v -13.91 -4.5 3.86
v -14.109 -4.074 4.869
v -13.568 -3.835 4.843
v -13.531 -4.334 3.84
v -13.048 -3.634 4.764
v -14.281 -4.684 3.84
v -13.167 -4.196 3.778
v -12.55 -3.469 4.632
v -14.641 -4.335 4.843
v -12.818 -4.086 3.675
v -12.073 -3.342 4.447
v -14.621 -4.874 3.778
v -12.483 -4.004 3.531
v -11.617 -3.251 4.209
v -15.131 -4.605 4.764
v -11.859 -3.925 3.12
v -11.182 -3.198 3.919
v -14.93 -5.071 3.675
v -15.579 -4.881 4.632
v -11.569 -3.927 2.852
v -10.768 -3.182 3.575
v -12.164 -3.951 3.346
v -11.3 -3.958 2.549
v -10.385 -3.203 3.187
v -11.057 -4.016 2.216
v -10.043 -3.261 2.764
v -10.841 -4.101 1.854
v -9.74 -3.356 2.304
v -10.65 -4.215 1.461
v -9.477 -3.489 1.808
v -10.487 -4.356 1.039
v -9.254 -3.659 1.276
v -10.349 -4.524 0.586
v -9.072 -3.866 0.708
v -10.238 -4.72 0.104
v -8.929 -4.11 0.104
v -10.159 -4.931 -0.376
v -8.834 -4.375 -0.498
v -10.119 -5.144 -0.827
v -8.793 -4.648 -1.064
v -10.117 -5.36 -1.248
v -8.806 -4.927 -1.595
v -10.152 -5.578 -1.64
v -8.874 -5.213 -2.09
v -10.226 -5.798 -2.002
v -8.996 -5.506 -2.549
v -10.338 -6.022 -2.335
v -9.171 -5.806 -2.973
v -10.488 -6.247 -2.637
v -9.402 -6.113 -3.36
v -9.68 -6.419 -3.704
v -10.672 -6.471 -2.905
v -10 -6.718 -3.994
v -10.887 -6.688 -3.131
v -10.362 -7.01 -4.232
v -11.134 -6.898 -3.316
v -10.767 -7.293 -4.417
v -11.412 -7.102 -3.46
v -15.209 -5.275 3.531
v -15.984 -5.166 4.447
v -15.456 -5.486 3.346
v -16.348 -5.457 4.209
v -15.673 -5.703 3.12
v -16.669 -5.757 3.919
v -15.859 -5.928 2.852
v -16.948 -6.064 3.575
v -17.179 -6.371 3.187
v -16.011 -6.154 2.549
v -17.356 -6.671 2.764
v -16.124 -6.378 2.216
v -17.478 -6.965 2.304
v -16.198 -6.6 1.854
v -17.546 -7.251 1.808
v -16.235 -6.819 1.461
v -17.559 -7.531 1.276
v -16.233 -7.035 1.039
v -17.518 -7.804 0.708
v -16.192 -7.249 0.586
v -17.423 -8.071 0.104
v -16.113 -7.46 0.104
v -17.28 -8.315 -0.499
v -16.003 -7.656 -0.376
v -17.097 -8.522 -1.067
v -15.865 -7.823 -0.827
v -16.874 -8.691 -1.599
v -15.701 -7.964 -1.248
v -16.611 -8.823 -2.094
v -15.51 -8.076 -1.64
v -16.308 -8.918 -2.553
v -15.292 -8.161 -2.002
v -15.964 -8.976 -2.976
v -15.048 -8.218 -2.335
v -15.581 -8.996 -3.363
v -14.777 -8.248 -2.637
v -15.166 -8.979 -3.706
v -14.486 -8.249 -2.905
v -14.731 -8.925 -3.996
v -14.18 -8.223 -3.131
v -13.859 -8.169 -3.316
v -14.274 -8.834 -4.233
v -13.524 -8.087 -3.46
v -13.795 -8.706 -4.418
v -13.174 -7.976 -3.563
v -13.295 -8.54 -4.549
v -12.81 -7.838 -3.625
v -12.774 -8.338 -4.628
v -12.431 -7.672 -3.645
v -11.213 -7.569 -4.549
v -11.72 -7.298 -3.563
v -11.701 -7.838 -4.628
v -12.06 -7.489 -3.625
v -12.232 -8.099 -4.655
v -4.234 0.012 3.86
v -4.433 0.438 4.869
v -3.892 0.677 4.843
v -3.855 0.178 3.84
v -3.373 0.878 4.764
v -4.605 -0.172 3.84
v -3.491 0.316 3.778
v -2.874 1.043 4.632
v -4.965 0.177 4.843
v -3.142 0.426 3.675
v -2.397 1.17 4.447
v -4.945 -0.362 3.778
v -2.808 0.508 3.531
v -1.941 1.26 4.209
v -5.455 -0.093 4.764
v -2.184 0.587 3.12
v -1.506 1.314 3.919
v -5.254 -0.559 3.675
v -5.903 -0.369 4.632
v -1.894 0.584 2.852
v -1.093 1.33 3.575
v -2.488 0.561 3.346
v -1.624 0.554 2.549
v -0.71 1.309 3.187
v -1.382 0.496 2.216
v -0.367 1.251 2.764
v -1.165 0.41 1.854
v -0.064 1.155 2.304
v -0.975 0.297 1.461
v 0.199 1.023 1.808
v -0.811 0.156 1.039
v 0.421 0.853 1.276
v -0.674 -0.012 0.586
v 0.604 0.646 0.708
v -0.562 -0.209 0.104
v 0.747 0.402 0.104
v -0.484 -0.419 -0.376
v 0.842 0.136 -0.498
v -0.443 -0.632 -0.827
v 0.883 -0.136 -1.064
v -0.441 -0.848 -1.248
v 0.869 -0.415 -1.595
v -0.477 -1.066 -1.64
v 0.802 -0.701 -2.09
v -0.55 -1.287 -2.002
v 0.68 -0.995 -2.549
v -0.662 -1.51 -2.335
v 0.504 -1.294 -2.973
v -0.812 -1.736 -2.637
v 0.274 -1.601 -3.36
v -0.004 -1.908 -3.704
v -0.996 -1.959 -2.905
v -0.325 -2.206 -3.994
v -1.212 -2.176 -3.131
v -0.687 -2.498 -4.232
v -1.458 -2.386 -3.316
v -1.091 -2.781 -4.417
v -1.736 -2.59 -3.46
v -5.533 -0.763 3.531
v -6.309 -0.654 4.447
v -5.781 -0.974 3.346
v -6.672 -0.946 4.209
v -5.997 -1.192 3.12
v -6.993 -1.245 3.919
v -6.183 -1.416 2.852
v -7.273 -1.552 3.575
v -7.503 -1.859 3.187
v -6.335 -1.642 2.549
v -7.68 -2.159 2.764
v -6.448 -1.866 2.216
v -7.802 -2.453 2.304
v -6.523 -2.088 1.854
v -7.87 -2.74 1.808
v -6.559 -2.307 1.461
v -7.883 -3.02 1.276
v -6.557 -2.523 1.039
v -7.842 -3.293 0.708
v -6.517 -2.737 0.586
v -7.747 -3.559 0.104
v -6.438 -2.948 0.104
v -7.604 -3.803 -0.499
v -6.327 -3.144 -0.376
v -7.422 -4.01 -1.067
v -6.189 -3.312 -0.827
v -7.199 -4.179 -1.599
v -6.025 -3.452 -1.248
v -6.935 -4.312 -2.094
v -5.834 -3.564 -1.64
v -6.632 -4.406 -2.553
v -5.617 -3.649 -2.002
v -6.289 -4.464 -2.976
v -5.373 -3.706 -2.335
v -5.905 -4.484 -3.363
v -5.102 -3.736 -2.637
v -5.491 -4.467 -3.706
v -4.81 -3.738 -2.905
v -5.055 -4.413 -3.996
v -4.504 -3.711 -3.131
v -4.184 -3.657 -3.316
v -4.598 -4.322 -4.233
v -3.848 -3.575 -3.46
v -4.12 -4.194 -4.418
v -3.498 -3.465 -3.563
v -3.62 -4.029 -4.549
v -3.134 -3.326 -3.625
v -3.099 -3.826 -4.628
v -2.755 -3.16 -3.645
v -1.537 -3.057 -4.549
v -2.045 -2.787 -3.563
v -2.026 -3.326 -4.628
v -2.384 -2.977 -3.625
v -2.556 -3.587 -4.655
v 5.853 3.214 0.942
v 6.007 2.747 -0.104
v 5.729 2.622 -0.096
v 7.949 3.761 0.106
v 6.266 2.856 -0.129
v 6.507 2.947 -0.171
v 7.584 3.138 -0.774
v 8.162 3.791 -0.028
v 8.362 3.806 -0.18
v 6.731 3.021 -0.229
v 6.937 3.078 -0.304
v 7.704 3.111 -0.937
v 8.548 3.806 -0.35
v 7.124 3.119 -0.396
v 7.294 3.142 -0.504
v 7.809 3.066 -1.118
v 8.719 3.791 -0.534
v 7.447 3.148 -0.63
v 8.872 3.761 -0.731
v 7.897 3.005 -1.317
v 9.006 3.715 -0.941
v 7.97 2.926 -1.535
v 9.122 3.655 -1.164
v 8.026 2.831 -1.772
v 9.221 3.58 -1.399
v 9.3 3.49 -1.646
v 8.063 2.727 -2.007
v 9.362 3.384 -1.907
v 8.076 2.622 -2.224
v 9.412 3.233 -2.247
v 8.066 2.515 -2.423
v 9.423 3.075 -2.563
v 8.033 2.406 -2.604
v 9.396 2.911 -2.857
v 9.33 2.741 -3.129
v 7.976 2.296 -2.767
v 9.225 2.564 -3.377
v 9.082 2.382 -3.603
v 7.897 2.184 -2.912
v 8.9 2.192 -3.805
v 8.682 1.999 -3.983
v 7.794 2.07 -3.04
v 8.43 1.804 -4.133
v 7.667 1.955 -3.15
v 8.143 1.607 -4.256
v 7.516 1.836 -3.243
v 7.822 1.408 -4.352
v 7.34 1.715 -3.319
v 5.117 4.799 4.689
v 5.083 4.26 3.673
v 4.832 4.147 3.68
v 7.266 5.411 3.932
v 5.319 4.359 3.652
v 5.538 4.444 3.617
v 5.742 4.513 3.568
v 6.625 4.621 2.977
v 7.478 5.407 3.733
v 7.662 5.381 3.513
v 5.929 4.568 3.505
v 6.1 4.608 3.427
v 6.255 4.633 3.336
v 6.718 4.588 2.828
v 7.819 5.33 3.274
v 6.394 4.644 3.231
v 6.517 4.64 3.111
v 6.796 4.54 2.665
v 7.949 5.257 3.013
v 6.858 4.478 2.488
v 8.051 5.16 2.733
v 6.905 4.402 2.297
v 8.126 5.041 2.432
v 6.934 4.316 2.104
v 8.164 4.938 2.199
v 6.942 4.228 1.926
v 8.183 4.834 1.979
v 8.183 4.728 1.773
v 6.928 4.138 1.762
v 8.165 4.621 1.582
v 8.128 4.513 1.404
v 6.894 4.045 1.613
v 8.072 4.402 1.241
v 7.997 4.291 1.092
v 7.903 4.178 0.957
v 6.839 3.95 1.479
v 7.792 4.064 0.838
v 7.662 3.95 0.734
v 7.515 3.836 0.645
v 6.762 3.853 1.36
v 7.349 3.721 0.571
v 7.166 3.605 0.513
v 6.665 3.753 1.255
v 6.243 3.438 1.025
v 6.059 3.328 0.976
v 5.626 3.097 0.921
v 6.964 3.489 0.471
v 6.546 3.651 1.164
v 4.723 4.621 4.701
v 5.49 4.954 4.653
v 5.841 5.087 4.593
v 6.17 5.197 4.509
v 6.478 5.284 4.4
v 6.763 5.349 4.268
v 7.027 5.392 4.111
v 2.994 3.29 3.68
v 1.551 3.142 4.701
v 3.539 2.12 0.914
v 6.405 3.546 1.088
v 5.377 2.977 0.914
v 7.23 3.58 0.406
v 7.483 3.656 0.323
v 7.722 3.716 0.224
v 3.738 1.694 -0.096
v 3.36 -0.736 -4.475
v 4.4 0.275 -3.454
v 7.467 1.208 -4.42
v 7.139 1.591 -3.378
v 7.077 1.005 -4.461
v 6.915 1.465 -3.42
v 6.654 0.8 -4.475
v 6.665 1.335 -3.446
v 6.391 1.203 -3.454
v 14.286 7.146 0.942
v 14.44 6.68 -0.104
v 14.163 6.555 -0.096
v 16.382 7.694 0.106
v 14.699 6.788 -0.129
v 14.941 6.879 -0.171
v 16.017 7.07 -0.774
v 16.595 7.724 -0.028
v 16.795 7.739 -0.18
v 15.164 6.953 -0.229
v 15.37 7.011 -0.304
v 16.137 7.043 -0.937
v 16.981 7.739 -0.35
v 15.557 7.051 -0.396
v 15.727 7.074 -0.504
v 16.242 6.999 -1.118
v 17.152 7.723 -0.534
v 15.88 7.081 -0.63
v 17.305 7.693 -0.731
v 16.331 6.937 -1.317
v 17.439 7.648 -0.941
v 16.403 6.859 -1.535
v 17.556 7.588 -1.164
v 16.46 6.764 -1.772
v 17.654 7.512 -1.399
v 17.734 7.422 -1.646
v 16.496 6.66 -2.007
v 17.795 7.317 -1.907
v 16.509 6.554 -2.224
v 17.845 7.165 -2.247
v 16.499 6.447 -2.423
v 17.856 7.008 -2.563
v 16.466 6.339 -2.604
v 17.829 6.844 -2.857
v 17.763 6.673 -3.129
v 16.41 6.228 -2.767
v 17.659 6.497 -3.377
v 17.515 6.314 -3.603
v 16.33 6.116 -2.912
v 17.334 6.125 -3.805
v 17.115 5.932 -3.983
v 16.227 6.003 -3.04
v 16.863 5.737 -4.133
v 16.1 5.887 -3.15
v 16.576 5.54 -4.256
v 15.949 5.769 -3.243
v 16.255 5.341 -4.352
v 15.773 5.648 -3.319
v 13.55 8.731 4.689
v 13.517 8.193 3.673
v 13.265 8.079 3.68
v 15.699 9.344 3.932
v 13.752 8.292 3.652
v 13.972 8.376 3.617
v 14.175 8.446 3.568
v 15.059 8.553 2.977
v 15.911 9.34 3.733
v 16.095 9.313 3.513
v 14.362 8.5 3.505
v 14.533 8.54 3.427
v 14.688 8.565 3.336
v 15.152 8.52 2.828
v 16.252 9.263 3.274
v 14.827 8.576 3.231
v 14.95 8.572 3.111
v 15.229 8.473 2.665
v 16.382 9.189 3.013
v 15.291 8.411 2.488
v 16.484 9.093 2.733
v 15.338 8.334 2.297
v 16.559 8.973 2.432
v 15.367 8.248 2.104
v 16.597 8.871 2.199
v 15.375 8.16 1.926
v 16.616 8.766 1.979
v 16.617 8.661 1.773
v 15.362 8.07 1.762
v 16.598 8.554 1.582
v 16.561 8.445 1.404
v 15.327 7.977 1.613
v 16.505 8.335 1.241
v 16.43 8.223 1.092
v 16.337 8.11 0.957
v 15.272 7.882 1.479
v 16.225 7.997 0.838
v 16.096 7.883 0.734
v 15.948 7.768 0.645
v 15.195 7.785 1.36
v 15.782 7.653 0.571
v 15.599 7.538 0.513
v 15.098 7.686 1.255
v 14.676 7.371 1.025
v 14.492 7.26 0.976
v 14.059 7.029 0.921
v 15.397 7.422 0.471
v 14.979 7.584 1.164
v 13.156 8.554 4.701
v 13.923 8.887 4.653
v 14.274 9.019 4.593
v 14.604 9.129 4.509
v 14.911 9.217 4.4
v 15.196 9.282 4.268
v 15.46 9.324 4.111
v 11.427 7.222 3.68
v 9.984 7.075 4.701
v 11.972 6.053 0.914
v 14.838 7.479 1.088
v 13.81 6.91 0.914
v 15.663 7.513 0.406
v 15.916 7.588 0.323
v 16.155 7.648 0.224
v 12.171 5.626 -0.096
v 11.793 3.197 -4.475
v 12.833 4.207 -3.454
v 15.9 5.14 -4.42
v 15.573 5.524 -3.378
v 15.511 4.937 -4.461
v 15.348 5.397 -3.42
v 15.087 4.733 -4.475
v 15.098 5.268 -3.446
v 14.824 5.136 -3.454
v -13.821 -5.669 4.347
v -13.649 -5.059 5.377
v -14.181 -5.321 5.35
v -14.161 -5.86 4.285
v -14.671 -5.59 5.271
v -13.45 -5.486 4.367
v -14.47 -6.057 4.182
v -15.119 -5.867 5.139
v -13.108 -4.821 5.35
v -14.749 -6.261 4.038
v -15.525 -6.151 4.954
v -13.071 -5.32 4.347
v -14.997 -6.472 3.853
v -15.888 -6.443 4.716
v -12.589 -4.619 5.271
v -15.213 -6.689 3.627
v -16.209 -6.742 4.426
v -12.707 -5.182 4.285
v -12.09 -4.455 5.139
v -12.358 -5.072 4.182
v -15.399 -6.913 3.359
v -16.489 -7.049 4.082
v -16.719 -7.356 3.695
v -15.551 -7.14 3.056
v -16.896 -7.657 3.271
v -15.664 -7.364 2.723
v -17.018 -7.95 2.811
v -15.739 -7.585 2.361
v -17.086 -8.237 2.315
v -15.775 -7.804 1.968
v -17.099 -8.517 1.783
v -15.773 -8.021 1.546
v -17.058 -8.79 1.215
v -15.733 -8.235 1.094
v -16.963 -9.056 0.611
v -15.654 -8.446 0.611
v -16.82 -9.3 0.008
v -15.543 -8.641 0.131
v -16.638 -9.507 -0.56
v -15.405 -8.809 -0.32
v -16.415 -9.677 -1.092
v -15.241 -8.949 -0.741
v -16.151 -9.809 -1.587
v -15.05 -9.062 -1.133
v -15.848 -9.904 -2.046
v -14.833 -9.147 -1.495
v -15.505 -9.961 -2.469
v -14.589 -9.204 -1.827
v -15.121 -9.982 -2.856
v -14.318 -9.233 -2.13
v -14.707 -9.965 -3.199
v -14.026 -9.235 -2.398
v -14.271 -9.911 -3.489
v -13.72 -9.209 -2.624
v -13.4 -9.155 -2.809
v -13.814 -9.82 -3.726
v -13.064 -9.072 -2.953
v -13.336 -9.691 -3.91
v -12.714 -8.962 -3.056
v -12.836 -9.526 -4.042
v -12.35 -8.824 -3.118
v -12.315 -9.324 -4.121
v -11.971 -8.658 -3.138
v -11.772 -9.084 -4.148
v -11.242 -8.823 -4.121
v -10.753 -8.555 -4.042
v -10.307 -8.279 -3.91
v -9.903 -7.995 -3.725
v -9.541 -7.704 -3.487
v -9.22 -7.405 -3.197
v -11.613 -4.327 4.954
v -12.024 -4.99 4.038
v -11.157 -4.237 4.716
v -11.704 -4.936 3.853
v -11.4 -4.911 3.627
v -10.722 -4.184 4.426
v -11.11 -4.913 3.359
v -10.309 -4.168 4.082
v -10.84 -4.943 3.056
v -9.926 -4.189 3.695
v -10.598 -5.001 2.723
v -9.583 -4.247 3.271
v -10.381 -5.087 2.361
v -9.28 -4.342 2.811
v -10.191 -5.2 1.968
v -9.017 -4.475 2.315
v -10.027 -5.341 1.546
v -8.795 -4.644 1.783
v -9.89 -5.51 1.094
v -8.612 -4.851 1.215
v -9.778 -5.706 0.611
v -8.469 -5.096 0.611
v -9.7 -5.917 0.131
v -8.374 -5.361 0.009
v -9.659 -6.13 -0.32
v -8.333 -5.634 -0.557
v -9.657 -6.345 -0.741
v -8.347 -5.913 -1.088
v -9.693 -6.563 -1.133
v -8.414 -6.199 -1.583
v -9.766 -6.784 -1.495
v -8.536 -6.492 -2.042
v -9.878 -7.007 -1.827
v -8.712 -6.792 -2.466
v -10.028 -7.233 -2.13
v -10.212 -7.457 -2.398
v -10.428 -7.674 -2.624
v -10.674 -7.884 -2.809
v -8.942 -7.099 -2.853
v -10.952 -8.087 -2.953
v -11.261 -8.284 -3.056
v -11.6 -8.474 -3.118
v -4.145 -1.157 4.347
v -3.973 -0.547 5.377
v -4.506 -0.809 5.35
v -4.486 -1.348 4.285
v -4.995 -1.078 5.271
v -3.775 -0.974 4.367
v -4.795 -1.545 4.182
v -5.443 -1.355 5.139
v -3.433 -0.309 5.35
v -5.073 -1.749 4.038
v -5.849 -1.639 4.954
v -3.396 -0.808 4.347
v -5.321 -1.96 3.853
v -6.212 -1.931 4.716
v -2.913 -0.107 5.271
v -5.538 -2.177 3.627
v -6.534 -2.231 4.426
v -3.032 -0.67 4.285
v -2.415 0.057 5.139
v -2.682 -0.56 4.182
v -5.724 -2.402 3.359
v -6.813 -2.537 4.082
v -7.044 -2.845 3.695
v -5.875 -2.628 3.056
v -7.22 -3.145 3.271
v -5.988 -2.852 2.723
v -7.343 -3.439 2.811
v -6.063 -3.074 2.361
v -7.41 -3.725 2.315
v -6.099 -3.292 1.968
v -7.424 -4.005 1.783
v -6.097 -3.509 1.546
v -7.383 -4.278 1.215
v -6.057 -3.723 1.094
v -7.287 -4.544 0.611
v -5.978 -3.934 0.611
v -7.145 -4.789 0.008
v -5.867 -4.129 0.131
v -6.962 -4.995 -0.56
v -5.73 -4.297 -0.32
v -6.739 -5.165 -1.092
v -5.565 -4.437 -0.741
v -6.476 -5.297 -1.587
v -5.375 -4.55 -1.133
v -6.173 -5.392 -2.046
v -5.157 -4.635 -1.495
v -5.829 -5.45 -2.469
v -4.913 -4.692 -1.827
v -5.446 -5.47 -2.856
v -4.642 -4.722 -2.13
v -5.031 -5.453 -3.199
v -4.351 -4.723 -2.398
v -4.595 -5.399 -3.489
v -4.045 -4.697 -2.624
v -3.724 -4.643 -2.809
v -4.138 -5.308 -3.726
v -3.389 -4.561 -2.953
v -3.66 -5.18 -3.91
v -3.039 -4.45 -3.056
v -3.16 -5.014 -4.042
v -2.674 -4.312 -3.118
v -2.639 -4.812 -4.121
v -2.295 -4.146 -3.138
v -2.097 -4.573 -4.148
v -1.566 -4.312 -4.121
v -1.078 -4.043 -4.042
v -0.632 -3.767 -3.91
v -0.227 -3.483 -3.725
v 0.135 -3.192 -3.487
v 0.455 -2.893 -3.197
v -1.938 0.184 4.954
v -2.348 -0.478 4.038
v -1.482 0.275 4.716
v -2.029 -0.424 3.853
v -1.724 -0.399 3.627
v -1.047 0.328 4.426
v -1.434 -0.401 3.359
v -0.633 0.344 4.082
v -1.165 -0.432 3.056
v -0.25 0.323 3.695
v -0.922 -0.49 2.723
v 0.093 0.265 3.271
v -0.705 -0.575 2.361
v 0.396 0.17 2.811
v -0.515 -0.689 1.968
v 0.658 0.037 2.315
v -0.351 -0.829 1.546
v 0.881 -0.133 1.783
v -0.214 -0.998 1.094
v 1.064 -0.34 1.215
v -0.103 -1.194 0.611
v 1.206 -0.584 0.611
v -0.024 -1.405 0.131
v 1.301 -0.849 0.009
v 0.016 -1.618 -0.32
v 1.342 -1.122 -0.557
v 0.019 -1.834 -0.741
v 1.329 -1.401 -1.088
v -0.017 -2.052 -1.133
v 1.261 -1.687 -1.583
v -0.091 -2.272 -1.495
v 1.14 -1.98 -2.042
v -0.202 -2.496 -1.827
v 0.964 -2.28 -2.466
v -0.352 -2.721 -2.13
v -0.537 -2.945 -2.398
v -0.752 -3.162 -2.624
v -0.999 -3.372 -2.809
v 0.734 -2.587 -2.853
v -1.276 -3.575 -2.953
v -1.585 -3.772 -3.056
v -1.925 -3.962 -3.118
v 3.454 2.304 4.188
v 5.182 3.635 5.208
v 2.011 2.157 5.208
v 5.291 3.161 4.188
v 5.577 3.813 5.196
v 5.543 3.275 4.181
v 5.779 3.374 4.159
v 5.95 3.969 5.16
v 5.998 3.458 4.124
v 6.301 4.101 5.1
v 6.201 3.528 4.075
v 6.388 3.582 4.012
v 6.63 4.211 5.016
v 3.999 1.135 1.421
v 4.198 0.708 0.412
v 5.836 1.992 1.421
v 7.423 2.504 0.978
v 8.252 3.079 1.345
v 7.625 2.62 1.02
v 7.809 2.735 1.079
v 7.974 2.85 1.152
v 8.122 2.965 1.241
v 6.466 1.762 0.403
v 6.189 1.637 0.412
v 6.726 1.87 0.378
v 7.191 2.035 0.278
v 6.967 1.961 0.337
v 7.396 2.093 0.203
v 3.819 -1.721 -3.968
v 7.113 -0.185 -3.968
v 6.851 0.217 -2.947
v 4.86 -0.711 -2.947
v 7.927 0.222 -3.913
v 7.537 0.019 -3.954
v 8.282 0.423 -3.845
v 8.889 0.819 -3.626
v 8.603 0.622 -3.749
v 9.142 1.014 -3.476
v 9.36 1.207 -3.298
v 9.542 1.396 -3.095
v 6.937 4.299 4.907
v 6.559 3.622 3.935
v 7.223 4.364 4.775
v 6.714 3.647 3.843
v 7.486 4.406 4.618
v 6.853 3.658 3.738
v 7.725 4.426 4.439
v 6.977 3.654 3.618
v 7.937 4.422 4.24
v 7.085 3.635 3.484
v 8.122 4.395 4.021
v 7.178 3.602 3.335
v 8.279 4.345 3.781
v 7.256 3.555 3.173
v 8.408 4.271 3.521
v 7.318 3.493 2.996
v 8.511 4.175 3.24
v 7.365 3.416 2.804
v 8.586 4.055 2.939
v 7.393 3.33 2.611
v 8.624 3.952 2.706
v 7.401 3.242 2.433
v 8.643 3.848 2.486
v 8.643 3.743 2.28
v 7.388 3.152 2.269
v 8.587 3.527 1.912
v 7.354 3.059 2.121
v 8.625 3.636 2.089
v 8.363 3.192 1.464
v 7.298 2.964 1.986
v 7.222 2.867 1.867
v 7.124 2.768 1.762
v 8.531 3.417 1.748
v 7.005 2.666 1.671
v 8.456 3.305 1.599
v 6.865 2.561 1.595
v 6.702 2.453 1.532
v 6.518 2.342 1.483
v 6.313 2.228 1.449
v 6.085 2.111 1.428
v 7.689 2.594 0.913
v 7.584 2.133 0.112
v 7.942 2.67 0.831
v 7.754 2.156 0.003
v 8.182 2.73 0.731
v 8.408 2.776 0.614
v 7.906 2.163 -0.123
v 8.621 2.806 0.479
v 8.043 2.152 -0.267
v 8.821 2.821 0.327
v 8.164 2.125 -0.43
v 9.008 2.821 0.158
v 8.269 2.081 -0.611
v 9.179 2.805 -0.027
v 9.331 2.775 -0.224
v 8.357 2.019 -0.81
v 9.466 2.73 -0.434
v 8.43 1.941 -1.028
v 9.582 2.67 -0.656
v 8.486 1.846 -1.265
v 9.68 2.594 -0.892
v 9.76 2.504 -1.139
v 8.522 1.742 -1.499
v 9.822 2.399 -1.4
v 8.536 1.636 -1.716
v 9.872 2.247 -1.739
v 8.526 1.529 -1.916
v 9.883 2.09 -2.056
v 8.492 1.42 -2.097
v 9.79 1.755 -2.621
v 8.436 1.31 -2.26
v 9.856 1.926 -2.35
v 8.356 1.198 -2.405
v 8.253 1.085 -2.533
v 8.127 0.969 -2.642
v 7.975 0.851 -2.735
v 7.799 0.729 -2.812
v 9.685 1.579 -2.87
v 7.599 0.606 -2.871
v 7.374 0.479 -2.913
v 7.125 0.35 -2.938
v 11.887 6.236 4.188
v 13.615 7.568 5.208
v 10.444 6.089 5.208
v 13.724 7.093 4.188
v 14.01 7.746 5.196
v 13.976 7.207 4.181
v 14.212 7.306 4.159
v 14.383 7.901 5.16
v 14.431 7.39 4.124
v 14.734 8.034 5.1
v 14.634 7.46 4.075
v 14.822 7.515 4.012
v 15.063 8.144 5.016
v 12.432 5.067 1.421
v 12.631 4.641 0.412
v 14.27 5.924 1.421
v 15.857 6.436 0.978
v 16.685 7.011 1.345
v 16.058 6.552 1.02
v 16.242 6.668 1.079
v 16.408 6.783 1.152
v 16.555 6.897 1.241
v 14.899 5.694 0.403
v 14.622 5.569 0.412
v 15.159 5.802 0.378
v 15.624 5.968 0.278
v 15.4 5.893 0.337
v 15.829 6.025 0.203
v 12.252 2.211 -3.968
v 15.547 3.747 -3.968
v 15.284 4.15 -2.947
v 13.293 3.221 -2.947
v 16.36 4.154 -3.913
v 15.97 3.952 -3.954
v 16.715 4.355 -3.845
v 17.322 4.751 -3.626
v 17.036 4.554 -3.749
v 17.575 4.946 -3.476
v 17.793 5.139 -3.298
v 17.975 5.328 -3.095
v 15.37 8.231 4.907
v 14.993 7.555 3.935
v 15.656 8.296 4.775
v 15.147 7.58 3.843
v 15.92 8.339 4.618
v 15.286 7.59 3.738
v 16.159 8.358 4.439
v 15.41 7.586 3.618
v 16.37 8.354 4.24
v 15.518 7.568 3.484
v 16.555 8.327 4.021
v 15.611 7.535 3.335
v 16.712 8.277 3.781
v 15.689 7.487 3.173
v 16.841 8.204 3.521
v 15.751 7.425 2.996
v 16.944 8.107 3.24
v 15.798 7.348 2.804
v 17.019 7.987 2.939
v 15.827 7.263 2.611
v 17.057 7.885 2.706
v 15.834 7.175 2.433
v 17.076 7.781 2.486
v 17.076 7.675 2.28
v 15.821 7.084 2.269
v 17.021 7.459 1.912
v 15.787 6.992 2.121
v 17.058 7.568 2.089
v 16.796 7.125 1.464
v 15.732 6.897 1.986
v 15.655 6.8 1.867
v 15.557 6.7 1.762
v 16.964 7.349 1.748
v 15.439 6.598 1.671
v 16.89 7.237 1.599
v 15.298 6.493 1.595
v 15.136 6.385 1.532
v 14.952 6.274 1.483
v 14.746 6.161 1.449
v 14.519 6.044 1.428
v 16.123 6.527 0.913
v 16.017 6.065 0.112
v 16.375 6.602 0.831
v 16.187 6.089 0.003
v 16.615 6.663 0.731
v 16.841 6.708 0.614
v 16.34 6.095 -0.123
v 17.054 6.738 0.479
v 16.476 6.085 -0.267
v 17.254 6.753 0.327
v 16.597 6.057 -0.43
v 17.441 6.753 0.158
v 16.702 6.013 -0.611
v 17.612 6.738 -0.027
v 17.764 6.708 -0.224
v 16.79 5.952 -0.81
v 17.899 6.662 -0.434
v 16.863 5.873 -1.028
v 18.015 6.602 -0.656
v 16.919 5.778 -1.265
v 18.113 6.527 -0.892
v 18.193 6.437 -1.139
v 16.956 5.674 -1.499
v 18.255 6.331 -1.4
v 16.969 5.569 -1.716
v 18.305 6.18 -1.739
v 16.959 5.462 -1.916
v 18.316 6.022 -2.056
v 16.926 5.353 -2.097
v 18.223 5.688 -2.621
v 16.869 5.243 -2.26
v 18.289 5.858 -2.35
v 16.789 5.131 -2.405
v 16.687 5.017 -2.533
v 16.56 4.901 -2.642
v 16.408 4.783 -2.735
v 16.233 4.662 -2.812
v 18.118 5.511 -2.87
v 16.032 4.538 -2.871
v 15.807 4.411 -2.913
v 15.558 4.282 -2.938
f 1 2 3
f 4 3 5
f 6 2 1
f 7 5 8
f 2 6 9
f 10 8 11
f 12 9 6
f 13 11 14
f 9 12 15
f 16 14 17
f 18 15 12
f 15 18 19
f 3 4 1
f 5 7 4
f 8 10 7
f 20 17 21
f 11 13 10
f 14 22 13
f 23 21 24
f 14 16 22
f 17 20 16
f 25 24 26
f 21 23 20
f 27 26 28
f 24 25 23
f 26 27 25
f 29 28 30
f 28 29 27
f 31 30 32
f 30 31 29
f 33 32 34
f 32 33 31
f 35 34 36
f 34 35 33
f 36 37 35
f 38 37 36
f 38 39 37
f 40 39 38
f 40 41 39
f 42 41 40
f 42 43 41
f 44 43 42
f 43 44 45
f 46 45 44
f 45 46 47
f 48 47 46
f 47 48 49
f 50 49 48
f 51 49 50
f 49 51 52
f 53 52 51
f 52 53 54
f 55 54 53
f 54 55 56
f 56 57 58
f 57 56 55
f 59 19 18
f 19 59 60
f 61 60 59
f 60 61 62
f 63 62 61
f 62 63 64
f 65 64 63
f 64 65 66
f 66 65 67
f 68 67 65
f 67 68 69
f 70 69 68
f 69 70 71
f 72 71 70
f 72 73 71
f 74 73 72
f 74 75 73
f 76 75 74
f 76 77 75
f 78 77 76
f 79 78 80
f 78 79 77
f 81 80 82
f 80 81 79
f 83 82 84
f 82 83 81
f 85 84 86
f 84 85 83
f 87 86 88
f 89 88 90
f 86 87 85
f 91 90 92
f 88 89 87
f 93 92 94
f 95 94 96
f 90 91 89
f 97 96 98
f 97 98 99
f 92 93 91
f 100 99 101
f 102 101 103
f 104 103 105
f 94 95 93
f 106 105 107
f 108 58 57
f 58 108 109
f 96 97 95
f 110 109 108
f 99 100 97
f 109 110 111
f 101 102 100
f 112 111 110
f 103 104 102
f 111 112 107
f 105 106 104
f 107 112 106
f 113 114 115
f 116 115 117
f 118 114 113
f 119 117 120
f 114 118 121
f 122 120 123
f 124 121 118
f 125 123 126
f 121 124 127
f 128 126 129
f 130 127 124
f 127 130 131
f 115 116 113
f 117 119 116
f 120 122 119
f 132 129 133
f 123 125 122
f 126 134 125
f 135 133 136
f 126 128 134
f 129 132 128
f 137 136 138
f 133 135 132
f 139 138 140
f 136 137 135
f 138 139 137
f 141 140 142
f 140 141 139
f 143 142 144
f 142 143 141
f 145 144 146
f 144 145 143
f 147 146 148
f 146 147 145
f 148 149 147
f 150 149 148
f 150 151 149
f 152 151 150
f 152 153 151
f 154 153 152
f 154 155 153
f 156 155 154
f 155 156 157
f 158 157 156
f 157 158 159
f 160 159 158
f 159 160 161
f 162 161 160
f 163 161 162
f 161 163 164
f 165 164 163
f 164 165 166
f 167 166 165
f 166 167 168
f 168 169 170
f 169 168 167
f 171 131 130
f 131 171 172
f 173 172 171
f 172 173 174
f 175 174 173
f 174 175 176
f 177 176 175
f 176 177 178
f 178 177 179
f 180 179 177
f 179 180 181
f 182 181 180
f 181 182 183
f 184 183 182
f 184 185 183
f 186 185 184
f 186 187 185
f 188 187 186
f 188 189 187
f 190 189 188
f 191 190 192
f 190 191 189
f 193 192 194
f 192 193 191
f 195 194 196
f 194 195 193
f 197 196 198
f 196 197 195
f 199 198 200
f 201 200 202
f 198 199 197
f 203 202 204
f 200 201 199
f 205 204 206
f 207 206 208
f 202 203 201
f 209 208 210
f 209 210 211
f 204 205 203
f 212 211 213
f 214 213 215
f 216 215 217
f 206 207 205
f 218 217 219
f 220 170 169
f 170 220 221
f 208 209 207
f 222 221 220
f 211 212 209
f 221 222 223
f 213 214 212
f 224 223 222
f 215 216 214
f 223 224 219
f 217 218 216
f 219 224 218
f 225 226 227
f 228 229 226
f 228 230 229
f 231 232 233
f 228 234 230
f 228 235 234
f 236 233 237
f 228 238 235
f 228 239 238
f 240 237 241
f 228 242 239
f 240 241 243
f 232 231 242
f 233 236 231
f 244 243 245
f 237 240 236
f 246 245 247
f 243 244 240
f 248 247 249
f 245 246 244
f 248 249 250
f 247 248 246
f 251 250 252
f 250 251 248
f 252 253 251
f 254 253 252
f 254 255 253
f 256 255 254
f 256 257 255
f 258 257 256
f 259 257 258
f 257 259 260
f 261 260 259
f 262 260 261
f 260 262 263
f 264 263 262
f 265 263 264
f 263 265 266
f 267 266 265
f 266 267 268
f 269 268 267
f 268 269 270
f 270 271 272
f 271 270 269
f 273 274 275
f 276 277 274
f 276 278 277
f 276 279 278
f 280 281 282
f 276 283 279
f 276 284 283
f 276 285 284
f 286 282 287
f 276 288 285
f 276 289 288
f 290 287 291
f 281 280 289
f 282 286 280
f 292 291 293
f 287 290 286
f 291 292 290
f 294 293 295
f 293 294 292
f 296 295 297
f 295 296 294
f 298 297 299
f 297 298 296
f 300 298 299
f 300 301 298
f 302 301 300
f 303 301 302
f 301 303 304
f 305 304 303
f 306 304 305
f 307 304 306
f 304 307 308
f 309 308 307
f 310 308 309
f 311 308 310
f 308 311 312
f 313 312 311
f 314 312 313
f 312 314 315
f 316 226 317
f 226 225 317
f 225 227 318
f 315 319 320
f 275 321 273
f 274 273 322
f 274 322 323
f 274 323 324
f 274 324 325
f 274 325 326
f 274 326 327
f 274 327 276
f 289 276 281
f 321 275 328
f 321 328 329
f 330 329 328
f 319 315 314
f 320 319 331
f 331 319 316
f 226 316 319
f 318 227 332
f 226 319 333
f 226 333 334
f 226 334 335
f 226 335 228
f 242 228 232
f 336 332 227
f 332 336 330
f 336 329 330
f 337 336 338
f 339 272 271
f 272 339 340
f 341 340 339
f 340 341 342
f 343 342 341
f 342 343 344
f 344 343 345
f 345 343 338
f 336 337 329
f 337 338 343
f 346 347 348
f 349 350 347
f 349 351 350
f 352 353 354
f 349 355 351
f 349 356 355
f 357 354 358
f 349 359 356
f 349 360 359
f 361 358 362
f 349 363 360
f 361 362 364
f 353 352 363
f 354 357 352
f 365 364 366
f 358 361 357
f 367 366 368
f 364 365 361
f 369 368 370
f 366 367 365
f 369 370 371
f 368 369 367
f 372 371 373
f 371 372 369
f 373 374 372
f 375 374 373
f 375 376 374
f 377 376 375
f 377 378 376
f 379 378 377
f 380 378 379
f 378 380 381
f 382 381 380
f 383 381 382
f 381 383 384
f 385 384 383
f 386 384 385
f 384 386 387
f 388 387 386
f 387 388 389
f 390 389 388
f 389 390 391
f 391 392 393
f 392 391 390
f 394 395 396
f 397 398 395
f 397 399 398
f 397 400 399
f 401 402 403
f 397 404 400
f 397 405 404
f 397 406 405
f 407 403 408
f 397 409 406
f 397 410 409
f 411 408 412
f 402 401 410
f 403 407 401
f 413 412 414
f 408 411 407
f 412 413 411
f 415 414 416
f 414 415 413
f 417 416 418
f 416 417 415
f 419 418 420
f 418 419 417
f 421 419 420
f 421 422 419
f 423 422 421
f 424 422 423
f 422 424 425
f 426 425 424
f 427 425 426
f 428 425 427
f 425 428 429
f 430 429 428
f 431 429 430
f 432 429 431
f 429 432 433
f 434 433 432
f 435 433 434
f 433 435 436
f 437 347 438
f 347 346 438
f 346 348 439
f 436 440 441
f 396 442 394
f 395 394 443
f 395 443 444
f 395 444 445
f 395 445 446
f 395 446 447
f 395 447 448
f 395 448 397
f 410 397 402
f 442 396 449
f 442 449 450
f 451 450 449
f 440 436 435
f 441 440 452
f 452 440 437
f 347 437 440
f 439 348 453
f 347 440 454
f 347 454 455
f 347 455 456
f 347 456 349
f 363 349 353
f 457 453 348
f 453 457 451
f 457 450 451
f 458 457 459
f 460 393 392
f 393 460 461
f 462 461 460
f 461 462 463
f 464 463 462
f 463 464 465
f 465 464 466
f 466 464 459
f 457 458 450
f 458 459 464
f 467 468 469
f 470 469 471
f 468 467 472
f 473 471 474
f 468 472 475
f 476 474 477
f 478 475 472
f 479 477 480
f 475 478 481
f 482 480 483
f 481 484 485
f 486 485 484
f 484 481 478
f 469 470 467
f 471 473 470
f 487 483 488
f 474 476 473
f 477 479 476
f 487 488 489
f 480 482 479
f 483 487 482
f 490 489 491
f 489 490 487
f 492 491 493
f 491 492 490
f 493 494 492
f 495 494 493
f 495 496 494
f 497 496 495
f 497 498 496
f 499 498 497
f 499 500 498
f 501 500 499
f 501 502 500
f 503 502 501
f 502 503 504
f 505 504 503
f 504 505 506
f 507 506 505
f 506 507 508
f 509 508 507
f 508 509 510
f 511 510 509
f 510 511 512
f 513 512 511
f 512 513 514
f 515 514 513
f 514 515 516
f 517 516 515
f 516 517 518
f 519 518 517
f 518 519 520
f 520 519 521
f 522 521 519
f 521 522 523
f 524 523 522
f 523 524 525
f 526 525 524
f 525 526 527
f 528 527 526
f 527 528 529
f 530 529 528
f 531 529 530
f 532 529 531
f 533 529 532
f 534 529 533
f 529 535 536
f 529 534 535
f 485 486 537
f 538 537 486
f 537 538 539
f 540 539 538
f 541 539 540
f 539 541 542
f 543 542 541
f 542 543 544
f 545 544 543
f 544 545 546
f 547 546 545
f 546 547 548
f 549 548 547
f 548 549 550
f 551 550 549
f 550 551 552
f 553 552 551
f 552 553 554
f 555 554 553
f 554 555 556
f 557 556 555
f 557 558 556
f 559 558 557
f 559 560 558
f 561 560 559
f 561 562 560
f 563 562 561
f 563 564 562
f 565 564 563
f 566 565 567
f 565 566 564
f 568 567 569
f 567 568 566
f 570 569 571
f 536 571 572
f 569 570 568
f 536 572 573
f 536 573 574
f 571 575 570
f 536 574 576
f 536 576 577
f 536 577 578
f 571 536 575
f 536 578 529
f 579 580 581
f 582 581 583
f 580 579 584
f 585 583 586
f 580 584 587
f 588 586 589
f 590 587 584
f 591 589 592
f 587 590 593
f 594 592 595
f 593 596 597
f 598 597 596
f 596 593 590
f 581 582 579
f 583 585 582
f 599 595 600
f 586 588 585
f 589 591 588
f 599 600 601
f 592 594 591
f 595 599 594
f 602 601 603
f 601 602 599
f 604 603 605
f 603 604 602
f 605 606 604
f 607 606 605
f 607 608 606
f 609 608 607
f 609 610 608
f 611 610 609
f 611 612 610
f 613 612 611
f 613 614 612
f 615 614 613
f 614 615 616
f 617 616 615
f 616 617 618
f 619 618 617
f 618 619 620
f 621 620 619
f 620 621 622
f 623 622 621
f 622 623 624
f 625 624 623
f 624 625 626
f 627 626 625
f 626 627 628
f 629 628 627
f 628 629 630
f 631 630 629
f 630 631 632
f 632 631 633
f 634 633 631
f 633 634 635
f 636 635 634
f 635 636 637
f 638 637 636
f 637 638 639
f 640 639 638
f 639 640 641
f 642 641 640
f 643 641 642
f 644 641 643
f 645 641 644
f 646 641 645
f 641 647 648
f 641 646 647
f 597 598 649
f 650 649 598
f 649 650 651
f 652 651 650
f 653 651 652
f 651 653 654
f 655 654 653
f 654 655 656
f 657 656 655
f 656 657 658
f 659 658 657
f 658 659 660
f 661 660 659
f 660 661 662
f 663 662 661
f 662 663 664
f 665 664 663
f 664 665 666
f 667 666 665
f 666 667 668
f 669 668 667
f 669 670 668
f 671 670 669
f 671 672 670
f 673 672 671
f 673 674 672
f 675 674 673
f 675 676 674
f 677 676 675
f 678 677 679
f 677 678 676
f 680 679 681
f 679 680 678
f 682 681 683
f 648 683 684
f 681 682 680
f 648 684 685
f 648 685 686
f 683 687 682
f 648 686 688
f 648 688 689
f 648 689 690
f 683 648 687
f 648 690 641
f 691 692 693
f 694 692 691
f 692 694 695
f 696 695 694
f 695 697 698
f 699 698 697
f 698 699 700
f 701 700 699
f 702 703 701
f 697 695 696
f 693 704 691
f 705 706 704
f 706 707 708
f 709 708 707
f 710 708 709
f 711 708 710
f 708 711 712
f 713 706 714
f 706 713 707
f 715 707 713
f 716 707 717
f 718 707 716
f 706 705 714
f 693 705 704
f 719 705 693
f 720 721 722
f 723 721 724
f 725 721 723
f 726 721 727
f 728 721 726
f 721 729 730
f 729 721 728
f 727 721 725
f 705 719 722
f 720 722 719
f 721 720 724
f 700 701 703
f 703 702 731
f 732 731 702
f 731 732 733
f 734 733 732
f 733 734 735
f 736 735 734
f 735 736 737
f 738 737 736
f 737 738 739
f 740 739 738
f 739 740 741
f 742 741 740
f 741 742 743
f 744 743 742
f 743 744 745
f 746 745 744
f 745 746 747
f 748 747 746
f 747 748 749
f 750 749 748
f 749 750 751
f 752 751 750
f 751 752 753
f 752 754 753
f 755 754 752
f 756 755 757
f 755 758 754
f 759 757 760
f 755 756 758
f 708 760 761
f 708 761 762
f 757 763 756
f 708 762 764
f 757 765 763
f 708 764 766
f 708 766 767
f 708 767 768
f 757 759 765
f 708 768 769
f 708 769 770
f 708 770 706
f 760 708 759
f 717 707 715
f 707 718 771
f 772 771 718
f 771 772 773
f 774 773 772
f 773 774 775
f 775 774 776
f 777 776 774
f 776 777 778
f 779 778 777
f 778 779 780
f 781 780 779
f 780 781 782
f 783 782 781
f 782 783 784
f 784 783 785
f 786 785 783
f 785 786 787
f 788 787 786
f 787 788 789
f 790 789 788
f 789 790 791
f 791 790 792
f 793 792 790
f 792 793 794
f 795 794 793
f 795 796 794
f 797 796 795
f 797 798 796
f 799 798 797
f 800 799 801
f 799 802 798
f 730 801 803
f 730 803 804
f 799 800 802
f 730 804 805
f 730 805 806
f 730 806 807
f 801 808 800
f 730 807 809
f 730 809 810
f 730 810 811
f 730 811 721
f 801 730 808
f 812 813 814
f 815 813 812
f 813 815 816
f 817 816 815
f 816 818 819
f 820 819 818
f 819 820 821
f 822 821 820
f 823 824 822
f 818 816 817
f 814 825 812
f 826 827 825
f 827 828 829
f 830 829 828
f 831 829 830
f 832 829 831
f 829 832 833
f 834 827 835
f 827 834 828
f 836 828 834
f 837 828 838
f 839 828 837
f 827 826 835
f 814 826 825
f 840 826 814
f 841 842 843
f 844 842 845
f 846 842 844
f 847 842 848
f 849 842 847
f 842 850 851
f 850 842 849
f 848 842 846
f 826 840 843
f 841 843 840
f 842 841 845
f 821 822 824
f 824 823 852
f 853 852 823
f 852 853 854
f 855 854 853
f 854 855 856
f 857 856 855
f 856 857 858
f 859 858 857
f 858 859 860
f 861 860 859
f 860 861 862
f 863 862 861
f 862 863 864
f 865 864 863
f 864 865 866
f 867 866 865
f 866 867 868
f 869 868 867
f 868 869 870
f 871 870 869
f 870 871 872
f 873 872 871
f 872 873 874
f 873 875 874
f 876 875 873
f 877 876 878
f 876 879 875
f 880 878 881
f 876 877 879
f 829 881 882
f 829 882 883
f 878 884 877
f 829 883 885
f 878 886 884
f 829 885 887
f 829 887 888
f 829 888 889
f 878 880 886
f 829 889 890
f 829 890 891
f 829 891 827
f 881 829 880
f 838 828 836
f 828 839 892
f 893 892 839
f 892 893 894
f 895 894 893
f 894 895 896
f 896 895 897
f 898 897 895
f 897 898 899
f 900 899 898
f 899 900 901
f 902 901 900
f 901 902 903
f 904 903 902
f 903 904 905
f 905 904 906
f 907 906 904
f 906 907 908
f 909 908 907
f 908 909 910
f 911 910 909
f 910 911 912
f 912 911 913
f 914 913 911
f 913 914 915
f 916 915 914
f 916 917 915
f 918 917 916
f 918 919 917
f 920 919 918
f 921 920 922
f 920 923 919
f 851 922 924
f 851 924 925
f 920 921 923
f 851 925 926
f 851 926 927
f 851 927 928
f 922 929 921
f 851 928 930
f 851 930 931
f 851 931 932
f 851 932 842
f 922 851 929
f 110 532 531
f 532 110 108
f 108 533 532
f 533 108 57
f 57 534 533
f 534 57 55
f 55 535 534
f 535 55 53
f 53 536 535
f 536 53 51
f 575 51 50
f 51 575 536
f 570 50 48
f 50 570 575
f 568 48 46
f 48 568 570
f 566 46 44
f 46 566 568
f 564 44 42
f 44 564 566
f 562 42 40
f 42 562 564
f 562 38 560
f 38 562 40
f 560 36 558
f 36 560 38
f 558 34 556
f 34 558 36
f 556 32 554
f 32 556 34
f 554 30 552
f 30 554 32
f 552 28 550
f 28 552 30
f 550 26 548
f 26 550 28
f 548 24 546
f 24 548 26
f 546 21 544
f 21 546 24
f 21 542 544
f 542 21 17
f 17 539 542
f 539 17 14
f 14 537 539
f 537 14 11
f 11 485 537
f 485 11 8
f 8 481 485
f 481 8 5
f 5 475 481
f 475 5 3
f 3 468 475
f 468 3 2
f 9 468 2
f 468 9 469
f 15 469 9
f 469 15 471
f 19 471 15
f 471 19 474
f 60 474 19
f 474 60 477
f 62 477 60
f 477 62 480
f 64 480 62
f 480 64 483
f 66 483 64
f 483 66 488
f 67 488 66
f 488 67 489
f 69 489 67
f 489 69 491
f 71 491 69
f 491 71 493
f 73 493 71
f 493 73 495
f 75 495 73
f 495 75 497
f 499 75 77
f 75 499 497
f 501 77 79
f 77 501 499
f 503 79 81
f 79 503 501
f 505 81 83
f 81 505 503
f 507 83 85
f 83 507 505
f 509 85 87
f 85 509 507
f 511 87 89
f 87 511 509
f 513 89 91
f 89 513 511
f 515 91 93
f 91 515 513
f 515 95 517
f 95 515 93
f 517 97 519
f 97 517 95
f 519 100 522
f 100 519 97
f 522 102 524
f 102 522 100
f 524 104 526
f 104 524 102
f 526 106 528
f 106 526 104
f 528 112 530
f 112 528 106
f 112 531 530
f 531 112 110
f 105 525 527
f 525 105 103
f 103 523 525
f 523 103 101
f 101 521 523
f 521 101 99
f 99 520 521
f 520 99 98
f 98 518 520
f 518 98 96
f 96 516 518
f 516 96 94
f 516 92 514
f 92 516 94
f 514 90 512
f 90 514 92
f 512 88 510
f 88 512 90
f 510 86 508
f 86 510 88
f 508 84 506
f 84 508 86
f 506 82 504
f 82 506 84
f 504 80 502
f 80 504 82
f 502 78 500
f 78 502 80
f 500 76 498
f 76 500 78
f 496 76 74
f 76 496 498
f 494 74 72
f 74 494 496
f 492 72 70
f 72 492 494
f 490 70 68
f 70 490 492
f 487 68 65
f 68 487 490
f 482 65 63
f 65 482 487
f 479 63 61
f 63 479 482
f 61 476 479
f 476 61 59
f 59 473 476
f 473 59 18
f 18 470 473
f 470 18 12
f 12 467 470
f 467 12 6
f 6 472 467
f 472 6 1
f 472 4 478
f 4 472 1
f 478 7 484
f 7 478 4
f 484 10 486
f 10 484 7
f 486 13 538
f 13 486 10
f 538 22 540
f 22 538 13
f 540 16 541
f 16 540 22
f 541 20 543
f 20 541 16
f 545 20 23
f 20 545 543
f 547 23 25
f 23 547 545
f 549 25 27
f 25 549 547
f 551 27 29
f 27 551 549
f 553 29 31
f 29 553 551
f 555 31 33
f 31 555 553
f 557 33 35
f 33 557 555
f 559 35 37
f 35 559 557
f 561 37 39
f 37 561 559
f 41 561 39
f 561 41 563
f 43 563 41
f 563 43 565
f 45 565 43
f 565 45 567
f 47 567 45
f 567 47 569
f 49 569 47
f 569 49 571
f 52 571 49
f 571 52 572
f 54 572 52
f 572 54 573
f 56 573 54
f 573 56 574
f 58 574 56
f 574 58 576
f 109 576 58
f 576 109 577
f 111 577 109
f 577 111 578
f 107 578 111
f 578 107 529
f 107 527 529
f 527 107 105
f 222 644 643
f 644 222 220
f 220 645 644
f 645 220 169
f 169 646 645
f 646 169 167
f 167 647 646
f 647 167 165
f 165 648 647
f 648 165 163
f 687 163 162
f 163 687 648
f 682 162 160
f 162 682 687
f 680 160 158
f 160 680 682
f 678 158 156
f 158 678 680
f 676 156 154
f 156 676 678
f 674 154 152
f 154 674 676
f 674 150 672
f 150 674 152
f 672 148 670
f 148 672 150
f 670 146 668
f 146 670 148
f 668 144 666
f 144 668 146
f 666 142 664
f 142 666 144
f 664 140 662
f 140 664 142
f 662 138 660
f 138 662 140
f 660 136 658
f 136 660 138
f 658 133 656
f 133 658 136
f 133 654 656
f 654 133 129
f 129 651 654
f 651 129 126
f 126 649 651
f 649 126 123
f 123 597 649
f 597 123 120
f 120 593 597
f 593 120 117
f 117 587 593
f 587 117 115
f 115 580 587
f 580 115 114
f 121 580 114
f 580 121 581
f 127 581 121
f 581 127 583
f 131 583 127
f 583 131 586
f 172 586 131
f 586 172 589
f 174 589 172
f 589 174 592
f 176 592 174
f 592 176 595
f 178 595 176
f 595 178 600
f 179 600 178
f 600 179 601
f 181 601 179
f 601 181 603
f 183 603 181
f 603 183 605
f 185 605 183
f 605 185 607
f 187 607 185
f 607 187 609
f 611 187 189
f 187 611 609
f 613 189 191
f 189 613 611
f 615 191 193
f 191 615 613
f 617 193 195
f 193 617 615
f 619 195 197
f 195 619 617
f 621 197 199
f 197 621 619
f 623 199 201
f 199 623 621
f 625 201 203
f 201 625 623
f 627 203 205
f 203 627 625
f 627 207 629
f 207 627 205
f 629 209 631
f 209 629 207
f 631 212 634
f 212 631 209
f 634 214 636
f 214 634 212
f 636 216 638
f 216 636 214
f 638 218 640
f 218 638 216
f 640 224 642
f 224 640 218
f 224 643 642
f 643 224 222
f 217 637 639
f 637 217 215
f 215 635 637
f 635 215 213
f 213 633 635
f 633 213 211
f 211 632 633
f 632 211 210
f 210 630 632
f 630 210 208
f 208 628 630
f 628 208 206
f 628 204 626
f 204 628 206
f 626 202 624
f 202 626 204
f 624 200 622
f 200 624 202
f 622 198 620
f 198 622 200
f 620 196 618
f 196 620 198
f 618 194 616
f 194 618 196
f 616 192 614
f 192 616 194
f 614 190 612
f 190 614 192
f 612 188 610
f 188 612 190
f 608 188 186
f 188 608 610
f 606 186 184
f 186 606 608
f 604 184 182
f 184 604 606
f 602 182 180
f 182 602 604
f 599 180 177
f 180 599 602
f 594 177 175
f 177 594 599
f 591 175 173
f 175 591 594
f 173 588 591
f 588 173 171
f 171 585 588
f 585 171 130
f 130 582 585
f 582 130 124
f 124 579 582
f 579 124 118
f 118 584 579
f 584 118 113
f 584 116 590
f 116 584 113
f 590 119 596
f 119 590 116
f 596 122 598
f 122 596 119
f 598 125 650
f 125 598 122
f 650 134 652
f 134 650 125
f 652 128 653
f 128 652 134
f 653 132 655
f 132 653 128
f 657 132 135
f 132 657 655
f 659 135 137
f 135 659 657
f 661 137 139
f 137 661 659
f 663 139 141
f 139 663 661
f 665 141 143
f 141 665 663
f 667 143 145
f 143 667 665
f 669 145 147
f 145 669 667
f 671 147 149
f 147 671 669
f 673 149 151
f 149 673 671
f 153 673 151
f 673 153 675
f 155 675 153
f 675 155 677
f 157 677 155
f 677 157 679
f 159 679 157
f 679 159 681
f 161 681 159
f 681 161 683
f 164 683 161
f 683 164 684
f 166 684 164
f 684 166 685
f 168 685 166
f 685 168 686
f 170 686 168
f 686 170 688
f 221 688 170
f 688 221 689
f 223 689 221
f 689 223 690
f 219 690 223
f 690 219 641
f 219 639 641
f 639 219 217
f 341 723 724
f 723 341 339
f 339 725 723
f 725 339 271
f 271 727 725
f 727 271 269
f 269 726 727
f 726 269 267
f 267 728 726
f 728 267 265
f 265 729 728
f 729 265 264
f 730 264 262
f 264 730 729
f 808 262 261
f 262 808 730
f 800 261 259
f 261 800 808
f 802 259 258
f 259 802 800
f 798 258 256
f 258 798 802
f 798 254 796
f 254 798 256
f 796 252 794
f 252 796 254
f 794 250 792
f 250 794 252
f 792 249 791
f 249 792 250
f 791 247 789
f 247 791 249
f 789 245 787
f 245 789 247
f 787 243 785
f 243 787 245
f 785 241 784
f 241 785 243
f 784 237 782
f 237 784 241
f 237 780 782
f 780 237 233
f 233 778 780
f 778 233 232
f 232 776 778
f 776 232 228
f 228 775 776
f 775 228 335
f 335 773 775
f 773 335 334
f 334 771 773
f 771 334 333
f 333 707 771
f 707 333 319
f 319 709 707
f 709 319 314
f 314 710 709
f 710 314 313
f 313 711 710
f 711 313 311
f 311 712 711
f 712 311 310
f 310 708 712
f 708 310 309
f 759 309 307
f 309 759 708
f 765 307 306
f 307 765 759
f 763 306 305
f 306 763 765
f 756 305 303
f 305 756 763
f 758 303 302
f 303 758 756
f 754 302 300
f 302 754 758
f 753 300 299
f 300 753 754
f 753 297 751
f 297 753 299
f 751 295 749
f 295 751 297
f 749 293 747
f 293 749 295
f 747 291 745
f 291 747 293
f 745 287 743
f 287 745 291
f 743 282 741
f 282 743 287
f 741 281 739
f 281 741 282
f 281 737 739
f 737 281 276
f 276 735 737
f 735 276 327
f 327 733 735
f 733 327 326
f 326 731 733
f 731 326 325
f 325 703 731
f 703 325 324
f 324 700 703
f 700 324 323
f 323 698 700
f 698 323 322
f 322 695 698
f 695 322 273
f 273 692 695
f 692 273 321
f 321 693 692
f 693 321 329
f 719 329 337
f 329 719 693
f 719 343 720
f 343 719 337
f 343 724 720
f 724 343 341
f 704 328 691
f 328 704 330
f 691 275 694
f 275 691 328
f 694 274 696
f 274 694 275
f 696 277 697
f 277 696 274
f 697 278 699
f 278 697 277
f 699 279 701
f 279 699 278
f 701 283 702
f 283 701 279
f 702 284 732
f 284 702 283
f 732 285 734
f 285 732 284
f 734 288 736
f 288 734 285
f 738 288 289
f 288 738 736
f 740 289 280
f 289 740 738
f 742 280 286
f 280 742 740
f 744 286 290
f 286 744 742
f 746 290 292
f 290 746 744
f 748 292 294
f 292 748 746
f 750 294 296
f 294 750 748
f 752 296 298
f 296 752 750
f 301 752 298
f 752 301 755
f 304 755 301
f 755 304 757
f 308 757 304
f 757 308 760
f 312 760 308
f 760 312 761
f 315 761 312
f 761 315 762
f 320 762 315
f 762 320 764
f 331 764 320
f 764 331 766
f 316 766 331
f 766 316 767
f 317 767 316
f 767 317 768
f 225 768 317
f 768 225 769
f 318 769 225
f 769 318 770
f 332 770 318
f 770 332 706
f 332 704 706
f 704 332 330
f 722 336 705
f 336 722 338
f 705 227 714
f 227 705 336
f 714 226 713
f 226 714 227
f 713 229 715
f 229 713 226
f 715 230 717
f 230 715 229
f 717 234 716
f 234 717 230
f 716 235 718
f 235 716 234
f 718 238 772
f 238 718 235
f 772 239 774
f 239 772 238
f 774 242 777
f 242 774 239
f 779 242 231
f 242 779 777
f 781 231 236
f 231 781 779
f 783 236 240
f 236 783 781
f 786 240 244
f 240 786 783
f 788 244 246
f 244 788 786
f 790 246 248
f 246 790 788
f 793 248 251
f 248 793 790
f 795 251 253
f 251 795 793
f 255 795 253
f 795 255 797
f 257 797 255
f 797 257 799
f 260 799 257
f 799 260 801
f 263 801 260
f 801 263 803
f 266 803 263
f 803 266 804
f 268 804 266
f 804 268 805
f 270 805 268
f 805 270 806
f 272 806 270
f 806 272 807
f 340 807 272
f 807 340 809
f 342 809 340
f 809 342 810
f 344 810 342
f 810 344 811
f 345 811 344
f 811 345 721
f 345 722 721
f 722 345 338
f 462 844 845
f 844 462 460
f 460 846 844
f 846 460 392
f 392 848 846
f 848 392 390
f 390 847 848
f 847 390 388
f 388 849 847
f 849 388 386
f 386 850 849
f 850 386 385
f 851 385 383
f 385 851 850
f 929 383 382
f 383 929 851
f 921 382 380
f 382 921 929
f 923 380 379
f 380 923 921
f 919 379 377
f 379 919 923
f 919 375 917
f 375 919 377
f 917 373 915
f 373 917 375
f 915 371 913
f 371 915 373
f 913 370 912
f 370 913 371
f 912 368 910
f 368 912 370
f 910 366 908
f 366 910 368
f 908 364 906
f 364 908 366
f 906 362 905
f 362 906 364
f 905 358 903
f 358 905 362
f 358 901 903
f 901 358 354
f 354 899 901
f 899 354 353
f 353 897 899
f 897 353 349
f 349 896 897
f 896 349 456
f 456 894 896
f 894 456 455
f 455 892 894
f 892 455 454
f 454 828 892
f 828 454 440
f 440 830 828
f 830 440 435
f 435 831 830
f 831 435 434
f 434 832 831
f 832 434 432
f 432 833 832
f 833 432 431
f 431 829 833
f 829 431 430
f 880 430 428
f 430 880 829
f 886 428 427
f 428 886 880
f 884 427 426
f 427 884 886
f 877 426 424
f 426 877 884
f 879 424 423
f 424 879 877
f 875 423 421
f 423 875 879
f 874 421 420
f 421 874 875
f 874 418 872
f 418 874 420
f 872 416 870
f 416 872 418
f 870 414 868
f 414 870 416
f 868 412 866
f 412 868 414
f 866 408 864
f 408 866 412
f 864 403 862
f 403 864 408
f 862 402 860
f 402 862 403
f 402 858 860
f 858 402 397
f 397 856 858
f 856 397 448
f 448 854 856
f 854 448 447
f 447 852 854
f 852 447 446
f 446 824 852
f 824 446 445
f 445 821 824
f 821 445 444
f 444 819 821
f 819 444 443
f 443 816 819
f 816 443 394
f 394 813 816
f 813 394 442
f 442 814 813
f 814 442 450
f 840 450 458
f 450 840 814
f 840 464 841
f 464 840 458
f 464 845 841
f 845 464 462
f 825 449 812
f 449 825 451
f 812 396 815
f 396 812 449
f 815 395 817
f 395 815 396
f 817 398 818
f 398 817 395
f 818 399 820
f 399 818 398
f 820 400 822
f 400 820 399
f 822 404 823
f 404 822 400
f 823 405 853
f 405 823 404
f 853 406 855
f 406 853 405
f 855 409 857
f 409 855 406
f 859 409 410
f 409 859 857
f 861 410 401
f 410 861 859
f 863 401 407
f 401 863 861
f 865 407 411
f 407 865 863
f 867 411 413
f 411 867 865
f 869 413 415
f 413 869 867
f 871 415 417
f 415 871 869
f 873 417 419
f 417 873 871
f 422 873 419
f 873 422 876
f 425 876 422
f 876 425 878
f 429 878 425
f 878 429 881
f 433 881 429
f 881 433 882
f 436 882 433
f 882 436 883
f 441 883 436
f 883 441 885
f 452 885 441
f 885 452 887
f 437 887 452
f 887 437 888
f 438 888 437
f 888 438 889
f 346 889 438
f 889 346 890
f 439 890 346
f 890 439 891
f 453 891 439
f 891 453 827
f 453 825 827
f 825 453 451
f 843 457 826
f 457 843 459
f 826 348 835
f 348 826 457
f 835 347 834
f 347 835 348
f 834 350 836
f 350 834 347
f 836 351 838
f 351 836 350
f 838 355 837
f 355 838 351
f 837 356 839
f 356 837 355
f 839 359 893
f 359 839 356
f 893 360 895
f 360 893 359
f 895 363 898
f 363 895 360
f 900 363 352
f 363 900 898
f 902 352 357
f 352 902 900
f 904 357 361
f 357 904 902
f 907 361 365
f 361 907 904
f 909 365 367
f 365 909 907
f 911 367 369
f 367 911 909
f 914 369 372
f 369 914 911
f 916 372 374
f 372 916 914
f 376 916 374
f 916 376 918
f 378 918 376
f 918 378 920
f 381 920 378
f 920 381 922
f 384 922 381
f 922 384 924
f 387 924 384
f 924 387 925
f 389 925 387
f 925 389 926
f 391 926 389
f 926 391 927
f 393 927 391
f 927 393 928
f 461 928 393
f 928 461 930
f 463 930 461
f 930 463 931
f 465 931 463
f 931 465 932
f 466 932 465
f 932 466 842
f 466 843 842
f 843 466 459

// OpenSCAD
$fn = 50;

difference() {
	union() {
		translate(v = [0, 0, 0]) {
			rotate(a = [65, 0, 25]) {
				difference() {
					union() {
						linear_extrude(height = 1.2) {
							text(font = "Candara:Light", halign = "center", size = 10, text = "OOBB", valign = "center");
						}
					}
					union();
				}
			}
		}
	}
	union();
}
